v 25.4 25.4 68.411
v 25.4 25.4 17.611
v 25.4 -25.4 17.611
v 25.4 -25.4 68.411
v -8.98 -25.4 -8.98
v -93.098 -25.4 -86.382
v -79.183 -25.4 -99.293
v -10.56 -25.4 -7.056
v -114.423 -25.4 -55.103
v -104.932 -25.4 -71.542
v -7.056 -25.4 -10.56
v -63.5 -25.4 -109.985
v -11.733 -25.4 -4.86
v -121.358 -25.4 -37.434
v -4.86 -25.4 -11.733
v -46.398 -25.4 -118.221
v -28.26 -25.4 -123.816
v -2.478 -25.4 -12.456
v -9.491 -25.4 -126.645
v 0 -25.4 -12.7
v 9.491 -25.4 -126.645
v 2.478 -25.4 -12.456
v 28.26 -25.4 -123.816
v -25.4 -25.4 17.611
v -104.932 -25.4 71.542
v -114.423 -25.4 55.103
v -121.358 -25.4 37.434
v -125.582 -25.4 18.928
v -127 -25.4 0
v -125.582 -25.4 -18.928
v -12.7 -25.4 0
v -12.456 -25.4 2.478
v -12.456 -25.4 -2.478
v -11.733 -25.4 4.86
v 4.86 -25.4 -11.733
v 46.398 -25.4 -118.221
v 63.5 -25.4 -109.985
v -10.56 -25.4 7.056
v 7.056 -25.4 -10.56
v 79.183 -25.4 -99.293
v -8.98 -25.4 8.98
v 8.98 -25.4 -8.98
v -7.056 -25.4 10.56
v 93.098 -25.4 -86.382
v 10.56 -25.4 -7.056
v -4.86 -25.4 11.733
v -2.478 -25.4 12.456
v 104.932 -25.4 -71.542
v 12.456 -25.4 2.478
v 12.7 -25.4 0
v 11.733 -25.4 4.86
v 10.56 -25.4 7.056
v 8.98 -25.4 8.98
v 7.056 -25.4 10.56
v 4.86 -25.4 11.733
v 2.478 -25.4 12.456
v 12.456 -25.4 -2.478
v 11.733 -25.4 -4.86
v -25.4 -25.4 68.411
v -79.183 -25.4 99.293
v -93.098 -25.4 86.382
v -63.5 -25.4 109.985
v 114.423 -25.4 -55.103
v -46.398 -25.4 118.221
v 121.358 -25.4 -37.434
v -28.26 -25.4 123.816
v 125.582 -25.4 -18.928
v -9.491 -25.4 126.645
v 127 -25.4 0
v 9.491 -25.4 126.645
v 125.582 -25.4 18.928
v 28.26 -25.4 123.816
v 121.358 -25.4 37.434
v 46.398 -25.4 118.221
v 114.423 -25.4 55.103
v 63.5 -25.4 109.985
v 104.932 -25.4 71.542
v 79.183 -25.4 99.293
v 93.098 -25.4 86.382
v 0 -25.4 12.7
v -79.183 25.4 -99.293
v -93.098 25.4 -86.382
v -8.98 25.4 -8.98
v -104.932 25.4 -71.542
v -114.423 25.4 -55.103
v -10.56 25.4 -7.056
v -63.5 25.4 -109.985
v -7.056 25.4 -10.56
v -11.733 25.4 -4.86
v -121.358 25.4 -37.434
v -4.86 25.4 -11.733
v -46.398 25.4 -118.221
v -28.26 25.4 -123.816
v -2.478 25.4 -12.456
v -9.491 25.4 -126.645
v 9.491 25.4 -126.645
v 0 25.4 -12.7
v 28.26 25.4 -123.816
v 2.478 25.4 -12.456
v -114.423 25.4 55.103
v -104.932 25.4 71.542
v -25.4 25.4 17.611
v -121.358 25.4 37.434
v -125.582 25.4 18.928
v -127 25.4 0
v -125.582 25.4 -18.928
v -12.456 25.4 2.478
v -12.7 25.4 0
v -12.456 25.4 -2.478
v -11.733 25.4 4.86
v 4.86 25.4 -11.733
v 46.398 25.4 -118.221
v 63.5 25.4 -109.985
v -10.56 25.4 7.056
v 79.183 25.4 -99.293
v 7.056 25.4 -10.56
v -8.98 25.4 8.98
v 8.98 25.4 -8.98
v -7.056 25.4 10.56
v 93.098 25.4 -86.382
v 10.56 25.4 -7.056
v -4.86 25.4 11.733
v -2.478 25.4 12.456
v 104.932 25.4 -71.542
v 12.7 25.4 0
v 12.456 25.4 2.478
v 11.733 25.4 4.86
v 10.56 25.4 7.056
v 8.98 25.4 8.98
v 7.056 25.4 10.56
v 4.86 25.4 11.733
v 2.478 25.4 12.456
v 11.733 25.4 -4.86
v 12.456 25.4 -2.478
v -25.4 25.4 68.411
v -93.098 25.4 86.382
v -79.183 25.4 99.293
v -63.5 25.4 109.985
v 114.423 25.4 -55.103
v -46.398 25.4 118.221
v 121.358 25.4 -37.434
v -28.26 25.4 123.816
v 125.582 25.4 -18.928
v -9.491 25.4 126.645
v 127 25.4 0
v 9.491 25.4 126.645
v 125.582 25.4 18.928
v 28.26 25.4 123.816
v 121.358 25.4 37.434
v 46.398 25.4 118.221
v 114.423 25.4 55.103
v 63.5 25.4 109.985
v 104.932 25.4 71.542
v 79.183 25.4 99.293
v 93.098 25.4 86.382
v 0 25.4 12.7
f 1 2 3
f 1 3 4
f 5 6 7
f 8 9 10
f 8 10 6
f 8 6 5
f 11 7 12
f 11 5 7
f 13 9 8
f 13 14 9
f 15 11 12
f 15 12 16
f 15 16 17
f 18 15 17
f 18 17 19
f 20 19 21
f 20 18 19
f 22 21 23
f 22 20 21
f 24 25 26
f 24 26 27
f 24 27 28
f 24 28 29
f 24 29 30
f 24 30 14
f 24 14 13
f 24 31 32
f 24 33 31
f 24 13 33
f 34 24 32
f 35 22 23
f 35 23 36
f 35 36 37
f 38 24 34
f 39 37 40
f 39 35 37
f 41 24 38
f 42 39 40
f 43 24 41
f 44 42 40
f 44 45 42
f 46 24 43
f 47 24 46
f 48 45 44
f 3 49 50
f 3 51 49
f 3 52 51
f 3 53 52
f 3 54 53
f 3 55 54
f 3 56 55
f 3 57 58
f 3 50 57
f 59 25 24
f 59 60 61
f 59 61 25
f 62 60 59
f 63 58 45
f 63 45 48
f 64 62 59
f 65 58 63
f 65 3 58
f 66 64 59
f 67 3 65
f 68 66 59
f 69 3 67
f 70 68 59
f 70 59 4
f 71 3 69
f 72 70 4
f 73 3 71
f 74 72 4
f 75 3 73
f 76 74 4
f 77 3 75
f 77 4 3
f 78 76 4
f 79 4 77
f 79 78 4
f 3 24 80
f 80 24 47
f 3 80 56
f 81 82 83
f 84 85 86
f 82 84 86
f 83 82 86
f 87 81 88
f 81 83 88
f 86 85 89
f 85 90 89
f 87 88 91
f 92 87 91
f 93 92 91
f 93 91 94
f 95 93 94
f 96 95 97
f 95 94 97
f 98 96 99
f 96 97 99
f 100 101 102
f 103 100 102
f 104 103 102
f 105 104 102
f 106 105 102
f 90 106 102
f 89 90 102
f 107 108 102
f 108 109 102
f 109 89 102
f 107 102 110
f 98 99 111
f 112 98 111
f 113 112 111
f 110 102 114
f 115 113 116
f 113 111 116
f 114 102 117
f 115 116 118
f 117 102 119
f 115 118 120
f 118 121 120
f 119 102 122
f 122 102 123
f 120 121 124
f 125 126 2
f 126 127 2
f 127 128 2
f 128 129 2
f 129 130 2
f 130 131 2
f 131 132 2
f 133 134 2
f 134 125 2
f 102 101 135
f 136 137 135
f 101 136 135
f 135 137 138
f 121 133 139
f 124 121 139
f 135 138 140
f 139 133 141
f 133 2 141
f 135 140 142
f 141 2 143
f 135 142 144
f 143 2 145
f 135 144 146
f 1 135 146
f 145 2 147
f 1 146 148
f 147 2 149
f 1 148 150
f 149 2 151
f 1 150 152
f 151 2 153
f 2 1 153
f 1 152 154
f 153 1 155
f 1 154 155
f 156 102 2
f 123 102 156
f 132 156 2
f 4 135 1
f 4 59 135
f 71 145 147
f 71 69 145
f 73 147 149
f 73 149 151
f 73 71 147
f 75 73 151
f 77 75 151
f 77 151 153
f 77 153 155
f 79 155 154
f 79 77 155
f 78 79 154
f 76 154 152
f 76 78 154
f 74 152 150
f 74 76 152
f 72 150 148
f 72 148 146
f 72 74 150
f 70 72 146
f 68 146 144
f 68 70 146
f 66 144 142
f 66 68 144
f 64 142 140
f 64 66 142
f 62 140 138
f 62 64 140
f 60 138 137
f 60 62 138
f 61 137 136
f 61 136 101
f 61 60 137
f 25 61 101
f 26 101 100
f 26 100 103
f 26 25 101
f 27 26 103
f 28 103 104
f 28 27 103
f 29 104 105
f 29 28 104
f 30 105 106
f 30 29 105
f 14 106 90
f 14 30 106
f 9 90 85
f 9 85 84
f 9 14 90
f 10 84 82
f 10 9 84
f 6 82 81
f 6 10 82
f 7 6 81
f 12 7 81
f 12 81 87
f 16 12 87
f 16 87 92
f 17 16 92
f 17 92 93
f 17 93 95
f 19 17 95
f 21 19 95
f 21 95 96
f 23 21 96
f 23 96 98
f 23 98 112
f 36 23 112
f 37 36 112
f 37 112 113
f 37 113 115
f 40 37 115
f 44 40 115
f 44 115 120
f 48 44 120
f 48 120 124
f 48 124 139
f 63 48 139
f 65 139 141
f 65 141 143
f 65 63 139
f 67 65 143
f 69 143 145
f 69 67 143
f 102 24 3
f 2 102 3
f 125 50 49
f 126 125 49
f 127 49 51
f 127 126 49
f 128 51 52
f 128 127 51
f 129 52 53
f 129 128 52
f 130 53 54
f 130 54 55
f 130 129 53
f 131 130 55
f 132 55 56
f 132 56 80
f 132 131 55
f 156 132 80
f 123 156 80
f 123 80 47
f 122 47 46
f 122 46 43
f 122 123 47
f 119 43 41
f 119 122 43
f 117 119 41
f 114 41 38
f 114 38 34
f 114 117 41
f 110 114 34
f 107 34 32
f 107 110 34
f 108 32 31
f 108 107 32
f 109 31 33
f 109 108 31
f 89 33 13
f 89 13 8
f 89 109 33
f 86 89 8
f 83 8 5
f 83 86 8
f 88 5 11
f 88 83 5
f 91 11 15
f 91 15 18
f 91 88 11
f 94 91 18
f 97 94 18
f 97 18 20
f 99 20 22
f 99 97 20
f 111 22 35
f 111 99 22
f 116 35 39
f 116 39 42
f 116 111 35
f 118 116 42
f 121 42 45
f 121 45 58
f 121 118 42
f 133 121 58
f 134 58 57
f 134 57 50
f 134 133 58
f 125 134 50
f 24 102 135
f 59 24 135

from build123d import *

# Parameters (mm, degrees)
F0_R     = 127
F0_R_2   = 12.7
F1_DEPTH = 25.4
F2_W     = 50.8
F2_H     = 50.8
F3_DEPTH = 25.4


with BuildPart() as f1:
    # F0 (on Front) → F1 (new body, symmetric)
    with BuildSketch(Plane.XZ):
        Circle(F0_R)
        Circle(F0_R_2, mode=Mode.SUBTRACT)
    extrude(amount=F1_DEPTH, both=True)

    # F2 (on Front) → F3 (cut, symmetric)
    with BuildSketch(Plane.XZ):
        with Locations((0, 43.010666)):
            Rectangle(F2_W, F2_H)
    extrude(amount=F3_DEPTH, both=True, mode=Mode.SUBTRACT)


solid = f1.part
